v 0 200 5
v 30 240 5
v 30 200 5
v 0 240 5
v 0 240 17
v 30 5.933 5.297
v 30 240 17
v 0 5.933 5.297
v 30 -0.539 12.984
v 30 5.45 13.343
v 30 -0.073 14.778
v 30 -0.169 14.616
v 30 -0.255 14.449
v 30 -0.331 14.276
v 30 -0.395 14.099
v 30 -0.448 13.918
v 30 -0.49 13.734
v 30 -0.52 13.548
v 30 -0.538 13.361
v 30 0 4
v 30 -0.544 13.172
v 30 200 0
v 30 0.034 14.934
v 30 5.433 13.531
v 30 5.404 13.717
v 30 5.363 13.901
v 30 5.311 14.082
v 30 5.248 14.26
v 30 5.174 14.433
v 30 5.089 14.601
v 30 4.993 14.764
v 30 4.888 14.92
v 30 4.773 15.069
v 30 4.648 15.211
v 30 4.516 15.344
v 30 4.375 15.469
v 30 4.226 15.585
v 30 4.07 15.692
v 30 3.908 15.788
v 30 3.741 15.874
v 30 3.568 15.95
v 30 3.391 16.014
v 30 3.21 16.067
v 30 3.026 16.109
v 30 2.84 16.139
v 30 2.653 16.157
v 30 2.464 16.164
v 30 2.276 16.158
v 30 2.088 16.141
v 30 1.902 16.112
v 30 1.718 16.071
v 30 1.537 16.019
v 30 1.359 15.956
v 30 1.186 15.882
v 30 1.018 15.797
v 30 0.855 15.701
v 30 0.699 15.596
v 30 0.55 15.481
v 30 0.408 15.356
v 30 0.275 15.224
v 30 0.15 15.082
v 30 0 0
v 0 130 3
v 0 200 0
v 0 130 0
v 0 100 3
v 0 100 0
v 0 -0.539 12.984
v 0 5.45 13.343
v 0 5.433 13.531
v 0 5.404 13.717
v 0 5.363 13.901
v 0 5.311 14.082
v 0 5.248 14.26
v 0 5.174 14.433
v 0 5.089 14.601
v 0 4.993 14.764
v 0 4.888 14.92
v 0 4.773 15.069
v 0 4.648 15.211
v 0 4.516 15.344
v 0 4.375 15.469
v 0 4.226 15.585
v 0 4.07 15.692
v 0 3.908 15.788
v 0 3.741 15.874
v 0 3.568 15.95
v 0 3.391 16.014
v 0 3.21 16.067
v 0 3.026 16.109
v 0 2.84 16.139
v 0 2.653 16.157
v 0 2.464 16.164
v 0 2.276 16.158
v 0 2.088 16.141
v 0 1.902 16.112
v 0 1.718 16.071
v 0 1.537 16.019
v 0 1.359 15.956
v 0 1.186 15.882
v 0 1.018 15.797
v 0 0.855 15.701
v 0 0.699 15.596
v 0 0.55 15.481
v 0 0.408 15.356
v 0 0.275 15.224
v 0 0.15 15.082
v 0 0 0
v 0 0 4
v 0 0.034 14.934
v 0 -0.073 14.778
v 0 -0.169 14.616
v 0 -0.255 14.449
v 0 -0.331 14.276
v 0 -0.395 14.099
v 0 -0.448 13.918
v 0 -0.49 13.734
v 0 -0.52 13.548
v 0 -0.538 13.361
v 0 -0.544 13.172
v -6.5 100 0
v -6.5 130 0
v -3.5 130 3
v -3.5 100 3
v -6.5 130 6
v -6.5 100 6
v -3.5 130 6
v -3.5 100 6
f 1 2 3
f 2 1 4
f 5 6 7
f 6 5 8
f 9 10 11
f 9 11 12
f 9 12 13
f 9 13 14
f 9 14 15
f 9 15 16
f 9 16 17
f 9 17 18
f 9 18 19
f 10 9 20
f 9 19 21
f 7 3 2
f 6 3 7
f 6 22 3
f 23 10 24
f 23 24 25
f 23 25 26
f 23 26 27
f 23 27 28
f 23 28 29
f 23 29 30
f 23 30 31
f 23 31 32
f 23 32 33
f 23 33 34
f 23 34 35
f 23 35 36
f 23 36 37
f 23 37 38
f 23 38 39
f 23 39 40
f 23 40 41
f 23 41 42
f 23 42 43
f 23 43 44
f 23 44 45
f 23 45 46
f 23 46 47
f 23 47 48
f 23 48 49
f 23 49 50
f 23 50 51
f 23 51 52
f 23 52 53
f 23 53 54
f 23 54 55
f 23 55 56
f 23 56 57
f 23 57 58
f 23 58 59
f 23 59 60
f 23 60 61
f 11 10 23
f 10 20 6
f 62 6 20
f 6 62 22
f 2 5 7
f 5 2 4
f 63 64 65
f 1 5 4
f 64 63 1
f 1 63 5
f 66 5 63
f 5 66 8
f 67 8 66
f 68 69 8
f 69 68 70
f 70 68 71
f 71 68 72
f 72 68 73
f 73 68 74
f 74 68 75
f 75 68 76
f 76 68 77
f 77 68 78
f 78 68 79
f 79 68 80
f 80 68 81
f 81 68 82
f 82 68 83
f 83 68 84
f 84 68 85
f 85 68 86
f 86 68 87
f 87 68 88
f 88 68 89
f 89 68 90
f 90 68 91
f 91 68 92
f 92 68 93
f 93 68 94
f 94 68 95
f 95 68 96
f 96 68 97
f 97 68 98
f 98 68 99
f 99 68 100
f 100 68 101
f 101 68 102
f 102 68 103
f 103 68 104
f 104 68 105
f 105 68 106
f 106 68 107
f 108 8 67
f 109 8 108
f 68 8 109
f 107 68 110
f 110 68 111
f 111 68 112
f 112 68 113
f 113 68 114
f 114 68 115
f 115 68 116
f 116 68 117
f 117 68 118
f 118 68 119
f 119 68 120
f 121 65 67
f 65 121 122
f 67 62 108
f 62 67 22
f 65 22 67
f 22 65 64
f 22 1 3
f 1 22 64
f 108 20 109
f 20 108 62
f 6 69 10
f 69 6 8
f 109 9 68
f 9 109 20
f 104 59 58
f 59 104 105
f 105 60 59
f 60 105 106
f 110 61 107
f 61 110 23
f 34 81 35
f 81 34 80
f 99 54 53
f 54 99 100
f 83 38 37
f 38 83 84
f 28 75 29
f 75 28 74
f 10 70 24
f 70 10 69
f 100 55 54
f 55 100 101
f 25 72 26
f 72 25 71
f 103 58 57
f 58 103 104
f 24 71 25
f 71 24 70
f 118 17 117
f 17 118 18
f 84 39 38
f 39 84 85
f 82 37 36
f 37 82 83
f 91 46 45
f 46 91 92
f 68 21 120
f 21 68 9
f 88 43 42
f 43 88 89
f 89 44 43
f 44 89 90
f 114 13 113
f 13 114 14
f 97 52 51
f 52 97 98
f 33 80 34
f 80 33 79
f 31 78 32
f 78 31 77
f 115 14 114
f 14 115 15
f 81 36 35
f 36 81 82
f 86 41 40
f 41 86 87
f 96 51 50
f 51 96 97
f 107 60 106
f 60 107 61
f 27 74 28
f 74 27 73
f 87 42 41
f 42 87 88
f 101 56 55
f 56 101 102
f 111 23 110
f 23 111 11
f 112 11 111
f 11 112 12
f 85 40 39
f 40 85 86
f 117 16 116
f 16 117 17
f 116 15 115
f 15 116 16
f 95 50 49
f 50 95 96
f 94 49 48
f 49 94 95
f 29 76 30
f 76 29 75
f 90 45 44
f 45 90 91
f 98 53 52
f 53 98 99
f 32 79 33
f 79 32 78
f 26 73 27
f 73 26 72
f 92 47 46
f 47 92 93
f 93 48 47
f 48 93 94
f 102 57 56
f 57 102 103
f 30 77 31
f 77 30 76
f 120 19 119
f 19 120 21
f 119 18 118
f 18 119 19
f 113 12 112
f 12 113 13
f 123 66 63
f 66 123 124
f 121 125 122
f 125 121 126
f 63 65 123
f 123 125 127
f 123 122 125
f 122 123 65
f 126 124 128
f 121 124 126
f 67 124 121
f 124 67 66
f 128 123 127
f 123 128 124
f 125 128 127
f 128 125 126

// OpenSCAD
//################# right stand with brace connector ######################
//#########################################################################

// picture a triangle ABC with 𝛾 = 90˚ and the hypothenuse c, then a will correspond to height(h) and b to length(l). A prism in the form of this triangle and width w of the resulting ramp:
module prism(w, l, h){
  polyhedron(
    points=[[0,0,0], [w,0,0], [w,l,0], [0,l,0], [0,l,h], [w,l,h]],
    faces=[[0,1,2,3],[5,4,3,2],[0,4,5,1],[0,3,4],[5,2,1]]
  );
}
// this is the big foot, the laptop will rest on it
module foot() {
  union(){
    translate([0,0,5]) prism(30,240,12);
    cube([30,200,5],false);
  }
}
// this part stops the laptop from sliding down
module wall(){
  $fn=100;
  union(){
    cube([30,6,9], center=false);
    translate([0,3,9]) rotate([0,90,0]) cylinder(h=30, r=3, center=false);
  }
}
// this part connects to the brace
module connector(){
  union(){
    translate([-6.5,100,0]) cube([6.5,30,3],false);
    translate([-6.5,100,3]) cube([3,30,3],false);
  }
}

// instantiating modules
// calculating gradient angle
a=atan(12/200);
union(){
  foot();
  translate([0,0,4]) rotate([a,0,0]){ // rotate to be orthogonal to the slide surface
    wall();
  }
  connector();
}
